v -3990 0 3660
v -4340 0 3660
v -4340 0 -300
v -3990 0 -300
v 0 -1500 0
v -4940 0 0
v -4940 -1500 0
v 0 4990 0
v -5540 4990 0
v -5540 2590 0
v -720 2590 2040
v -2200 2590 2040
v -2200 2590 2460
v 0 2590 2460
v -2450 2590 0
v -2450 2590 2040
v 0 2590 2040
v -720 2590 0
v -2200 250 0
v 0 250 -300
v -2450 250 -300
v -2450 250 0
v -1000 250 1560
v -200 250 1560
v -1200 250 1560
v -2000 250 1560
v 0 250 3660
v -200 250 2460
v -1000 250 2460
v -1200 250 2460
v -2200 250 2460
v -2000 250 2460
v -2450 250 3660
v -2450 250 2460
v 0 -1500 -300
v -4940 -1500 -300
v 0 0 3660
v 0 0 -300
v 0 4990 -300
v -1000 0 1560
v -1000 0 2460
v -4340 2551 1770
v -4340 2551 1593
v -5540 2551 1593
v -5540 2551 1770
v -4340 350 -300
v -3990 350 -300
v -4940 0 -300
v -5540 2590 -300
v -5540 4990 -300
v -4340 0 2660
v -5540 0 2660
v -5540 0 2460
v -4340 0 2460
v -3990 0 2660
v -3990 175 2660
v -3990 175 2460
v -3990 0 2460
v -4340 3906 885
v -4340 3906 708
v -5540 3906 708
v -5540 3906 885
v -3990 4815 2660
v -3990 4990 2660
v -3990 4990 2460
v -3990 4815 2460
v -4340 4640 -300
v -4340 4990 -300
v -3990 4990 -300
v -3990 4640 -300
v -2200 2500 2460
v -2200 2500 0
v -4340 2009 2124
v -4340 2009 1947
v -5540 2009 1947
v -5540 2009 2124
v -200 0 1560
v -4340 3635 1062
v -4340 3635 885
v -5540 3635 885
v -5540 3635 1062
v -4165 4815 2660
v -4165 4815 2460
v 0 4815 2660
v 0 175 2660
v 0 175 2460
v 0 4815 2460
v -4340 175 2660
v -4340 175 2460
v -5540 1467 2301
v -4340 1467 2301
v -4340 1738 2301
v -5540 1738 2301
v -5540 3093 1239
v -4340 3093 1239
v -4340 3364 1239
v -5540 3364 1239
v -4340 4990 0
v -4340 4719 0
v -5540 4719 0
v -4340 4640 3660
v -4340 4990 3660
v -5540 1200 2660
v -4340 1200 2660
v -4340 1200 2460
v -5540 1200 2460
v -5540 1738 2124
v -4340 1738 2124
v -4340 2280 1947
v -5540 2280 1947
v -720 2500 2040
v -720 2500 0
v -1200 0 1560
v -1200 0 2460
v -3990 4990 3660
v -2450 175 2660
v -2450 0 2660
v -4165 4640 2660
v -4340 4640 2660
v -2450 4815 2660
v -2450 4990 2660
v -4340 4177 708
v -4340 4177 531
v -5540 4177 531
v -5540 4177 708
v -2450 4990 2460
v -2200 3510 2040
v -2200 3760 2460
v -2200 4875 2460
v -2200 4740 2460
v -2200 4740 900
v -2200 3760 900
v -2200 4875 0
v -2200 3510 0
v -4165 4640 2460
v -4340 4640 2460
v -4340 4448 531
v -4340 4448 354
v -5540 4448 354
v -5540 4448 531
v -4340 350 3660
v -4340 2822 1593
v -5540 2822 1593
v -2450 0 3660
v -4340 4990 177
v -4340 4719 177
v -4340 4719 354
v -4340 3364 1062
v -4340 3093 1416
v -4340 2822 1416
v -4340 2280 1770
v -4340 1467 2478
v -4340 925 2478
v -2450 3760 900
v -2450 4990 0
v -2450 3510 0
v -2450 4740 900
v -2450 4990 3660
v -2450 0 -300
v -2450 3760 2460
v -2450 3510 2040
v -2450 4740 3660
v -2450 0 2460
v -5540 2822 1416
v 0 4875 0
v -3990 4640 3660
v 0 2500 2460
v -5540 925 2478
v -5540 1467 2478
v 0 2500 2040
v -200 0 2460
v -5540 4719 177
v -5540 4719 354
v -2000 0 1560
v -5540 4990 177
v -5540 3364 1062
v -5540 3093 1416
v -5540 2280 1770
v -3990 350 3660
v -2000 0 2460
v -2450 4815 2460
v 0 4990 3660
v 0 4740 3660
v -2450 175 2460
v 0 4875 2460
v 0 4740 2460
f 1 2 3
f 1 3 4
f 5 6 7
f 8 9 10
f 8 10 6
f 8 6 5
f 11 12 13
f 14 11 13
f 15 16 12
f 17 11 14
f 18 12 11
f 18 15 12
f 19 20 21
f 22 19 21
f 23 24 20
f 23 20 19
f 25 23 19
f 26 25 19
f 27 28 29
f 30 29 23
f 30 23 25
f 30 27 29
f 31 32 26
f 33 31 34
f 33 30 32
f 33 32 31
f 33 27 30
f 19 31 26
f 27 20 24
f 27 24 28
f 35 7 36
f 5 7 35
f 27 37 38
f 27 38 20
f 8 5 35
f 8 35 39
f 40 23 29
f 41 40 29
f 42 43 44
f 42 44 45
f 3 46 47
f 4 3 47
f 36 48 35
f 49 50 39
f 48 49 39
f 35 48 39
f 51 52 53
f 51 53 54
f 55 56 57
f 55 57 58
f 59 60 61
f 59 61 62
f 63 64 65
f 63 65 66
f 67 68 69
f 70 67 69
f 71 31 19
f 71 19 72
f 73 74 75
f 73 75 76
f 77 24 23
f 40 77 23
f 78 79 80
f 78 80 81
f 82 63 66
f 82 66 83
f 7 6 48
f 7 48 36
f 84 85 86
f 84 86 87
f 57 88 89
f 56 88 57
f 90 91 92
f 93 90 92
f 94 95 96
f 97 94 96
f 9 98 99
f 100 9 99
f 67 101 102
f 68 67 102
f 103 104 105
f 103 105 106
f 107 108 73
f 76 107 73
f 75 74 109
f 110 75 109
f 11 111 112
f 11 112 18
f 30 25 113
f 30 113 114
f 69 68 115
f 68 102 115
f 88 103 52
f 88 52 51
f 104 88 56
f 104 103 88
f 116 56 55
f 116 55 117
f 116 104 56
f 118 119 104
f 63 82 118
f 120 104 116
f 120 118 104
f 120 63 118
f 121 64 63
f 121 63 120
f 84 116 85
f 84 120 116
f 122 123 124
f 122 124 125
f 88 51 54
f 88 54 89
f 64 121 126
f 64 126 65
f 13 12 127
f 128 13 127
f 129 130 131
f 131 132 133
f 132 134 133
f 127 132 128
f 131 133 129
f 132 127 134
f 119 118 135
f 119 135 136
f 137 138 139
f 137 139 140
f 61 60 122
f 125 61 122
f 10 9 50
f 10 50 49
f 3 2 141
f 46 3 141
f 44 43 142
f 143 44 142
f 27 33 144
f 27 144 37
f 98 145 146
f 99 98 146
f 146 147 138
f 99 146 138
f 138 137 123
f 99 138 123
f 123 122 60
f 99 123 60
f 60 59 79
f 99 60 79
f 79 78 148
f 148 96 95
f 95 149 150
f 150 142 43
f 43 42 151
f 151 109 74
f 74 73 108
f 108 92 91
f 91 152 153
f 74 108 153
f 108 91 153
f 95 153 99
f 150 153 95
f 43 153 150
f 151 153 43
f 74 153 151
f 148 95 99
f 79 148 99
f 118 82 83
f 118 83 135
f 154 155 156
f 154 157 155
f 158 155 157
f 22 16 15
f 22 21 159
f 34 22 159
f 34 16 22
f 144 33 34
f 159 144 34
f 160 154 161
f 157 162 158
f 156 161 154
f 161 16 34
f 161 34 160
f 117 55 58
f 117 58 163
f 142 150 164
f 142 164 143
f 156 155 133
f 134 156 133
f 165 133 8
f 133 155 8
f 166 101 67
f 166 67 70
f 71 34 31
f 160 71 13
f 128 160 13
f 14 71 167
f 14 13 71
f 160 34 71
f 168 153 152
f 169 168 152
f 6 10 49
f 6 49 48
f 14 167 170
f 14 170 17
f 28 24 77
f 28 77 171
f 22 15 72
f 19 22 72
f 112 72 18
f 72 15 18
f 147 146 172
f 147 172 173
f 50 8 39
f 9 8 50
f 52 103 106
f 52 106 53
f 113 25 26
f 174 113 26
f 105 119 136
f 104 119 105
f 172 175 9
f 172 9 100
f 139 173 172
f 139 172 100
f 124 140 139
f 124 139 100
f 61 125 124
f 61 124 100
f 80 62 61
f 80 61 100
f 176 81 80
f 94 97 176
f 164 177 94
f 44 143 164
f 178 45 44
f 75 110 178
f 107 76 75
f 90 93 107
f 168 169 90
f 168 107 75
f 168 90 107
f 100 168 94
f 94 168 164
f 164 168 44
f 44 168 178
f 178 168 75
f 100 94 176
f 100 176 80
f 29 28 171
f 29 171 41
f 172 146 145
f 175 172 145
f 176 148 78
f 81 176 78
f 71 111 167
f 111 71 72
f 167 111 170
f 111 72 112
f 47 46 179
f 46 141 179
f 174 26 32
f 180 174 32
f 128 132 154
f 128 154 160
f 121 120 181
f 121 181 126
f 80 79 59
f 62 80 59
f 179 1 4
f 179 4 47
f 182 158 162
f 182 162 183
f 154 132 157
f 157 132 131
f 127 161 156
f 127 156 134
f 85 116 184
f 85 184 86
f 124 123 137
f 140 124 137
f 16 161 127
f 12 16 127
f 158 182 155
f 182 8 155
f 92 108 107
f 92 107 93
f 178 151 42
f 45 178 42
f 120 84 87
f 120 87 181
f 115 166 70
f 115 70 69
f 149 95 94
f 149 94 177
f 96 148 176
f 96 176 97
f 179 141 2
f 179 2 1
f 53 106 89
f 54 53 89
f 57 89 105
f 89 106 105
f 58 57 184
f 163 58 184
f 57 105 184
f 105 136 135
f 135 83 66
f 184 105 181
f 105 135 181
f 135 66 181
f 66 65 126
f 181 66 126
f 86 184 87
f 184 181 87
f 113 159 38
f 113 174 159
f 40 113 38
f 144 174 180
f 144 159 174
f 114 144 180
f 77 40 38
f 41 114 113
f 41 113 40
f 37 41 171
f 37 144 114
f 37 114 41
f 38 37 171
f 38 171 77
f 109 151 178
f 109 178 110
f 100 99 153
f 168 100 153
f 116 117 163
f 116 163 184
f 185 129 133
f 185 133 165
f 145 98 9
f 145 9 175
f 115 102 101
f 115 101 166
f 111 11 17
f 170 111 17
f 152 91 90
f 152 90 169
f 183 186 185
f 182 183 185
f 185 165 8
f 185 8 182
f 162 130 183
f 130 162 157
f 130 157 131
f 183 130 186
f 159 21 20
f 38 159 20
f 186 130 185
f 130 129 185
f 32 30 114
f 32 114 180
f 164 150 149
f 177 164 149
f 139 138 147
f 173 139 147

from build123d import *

# Parameters (mm, degrees)
F2_W          = 1480
F2_H          = 90
F2_W_2        = 350
F2_H_2        = 350
F2_W_3        = 250
F2_H_3        = 920
F2_H_4        = 135
F2_H_5        = 1230
F2_W_4        = 720
F3_DEPTH      = 300
F5_DEPTH      = 200
F6_DEPTH      = 2460
F7_START      = 2460
F7_DEPTH      = 1200
F8_DEPTH      = 3660
F8_DEPTH_BACK = 300
F9_W          = 271
F9_H          = 177
F10_DEPTH     = 1200
F11_DEPTH     = 2040
F12_W         = 800
F12_H         = 900
F13_DEPTH     = 250
F14_W         = 980
F14_H         = 1560
F15_DEPTH     = 250


# Not quite as in the source:
# - a feature names something its author has since deleted; it is built from what else it names


with BuildPart() as f3:
    # F2 (on Top) → F3 (new body)
    with BuildSketch(Plane.XY):
        Polygon((-4340, 4990), (-5540, 4990), (-5540, 2590), (-4940, 0), (-4340, 0), (-4340, 350), (-3990, 350), (-3990, 0), (-2450, 0), (-2450, 250), (-2450, 2590), (-2450, 3510), (-2450, 4740), (-2450, 4875), (-2450, 4990), (-3990, 4990), (-3990, 4640), (-4340, 4640), align=None)
        with Locations((-1460, 2545)):
            Rectangle(F2_W, F2_H)
        Polygon((-4340, 0), (-4940, 0), (-4940, -1500), (0, -1500), (0, 0), (-2450, 0), (-3990, 0), align=None)
        Polygon((0, 4990), (-2450, 4990), (-2450, 4875), (-2200, 4875), (-1229.6366691589, 4875), (0, 4875), align=None)
        with Locations((-4165, 4815)):
            Rectangle(F2_W_2, F2_H_2)
        with Locations((-4165, 175)):
            Rectangle(F2_W_2, F2_H_2)
        Polygon((-2200, 250), (0, 250), (0, 2500), (-720, 2500), (-2200, 2500), align=None)
        Polygon((-2450, 250), (-2450, 0), (0, 0), (0, 250), (-2200, 250), align=None)
        with Locations((-2325, 3050)):
            Rectangle(F2_W_3, F2_H_3)
        Polygon((0, 4740), (0, 4875), (-1229.6366691589, 4875), (-2200, 4875), (-2200, 4740), align=None)
        with Locations((-2325, 4807.5)):
            Rectangle(F2_W_3, F2_H_4)
        Polygon((-2450, 2590), (-2450, 250), (-2200, 250), (-2200, 2500), (-2200, 2590), align=None)
        with Locations((-2325, 4125)):
            Rectangle(F2_W_3, F2_H_5)
        Polygon((0, 2590), (0, 4740), (-2200, 4740), (-2200, 3510), (-2200, 2590), (-720, 2590), align=None)
        with Locations((-360, 2545)):
            Rectangle(F2_W_4, F2_H)
    extrude(amount=-F3_DEPTH)


with BuildPart() as f5:
    # F4 (on offset) → F5 (new body)
    with BuildSketch(Plane.XY.offset(2660)):
        Polygon((-4340, 1200), (-5540, 1200), (-5540, 0), (-4340, 0), (-4340, 175), (-3990, 175), (-3990, 0), (-2450, 0), (-2450, 175), (0, 175), (0, 4815), (-2450, 4815), (-2450, 4990), (-3990, 4990), (-3990, 4815), (-4165, 4815), (-4165, 4640), (-4340, 4640), align=None)
    extrude(amount=-F5_DEPTH)


with BuildPart() as f6:
    # F2 (on Top) → F6 (new body, through all)
    with BuildSketch(Plane.XY):
        Polygon((0, 4990), (-2450, 4990), (-2450, 4875), (-2200, 4875), (-1229.6366691589, 4875), (0, 4875), align=None)
        with Locations((-2325, 4807.5)):
            Rectangle(F2_W_3, F2_H_4)
        with Locations((-2325, 3050)):
            Rectangle(F2_W_3, F2_H_3)
        with Locations((-1460, 2545)):
            Rectangle(F2_W, F2_H)
        Polygon((-2450, 2590), (-2450, 250), (-2200, 250), (-2200, 2500), (-2200, 2590), align=None)
        with Locations((-2325, 4125)):
            Rectangle(F2_W_3, F2_H_5)
        with Locations((-360, 2545)):
            Rectangle(F2_W_4, F2_H)
    extrude(amount=F6_DEPTH)

    # F2 (on Top) → F7 (join)
    with BuildSketch(Plane.XY.offset(F7_START)):
        Polygon((0, 4740), (0, 4875), (-1229.6366691589, 4875), (-2200, 4875), (-2200, 4740), align=None)
        Polygon((0, 4990), (-2450, 4990), (-2450, 4875), (-2200, 4875), (-1229.6366691589, 4875), (0, 4875), align=None)
        with Locations((-2325, 4807.5)):
            Rectangle(F2_W_3, F2_H_4)
    extrude(amount=F7_DEPTH)

    # F2 (on Top) → F8 (join, two sides)
    with BuildSketch(Plane.XY) as f8_sk:
        Polygon((-2450, 250), (-2450, 0), (0, 0), (0, 250), (-2200, 250), align=None)
    extrude(amount=F8_DEPTH)
    extrude(f8_sk.sketch, amount=-F8_DEPTH_BACK)

    # F2 (on Top) → F11 (cut)
    with BuildSketch(Plane.XY):
        with Locations((-2325, 3050)):
            Rectangle(F2_W_3, F2_H_3)
        with Locations((-360, 2545)):
            Rectangle(F2_W_4, F2_H)
    extrude(amount=F11_DEPTH, mode=Mode.SUBTRACT)

    # F12 (on face) → F13 (cut, through all)
    with BuildSketch(Plane(origin=(0, 250, 0), x_dir=(-1, 0, 0), z_dir=(0, 1, 0))):
        with Locations((600, 2010)):
            Rectangle(F12_W, F12_H)
        with Locations((1600, 2010)):
            Rectangle(F12_W, F12_H)
    extrude(amount=-F13_DEPTH, mode=Mode.SUBTRACT)

    # F14 (on face) → F15 (cut, through all)
    with BuildSketch(Plane.YZ.offset(-2200)):
        with Locations((4250, 1680)):
            Rectangle(F14_W, F14_H)
    extrude(amount=-F15_DEPTH, mode=Mode.SUBTRACT)


with BuildPart() as f8:
    # F2 (on Top) → F8, piece 2 (new body, two sides)
    with BuildSketch(Plane.XY) as f8_2_sk:
        with Locations((-4165, 175)):
            Rectangle(F2_W_2, F2_H_2)
    extrude(amount=F8_DEPTH)
    extrude(f8_2_sk.sketch, amount=-F8_DEPTH_BACK)


with BuildPart() as f8b:
    # F2 (on Top) → F8, piece 3 (new body, two sides)
    with BuildSketch(Plane.XY) as f8_3_sk:
        with Locations((-4165, 4815)):
            Rectangle(F2_W_2, F2_H_2)
    extrude(amount=F8_DEPTH)
    extrude(f8_3_sk.sketch, amount=-F8_DEPTH_BACK)


with BuildPart() as f10:
    # F9 (on face) → F10 (new body)
    with BuildSketch(Plane(origin=(-4340, 0, 0), x_dir=(0, -1, 0), z_dir=(-1, 0, 0))):
        with Locations((-4854.5, 88.5)):
            Rectangle(F9_W, F9_H)
        Polygon((-4719, 177), (-4719, 0), (-4448, 177), align=None)
        with Locations((-4583.5, 265.5)):
            Rectangle(F9_W, F9_H)
        Polygon((-4448, 354), (-4448, 177), (-4177, 354), align=None)
        with Locations((-4312.5, 442.5)):
            Rectangle(F9_W, F9_H)
        Polygon((-4177, 531), (-4177, 354), (-3906, 531), align=None)
        with Locations((-4041.5, 619.5)):
            Rectangle(F9_W, F9_H)
        Polygon((-3906, 708), (-3906, 531), (-3635, 708), align=None)
        with Locations((-3770.5, 796.5)):
            Rectangle(F9_W, F9_H)
        Polygon((-3635, 885), (-3635, 708), (-3364, 885), align=None)
        with Locations((-3499.5, 973.5)):
            Rectangle(F9_W, F9_H)
        Polygon((-3364, 1062), (-3364, 885), (-3093, 1062), align=None)
        with Locations((-3228.5, 1150.5)):
            Rectangle(F9_W, F9_H)
        Polygon((-3093, 1239), (-3093, 1062), (-2822, 1239), align=None)
        with Locations((-2957.5, 1327.5)):
            Rectangle(F9_W, F9_H)
        Polygon((-2822, 1416), (-2822, 1239), (-2551, 1416), align=None)
        with Locations((-2686.5, 1504.5)):
            Rectangle(F9_W, F9_H)
        Polygon((-2551, 1593), (-2551, 1416), (-2280, 1593), align=None)
        with Locations((-2415.5, 1681.5)):
            Rectangle(F9_W, F9_H)
        Polygon((-2280, 1770), (-2280, 1593), (-2009, 1770), align=None)
        with Locations((-2144.5, 1858.5)):
            Rectangle(F9_W, F9_H)
        Polygon((-2009, 1947), (-2009, 1770), (-1738, 1947), align=None)
        with Locations((-1873.5, 2035.5)):
            Rectangle(F9_W, F9_H)
        Polygon((-1738, 2124), (-1738, 1947), (-1467, 2124), align=None)
        with Locations((-1602.5, 2212.5)):
            Rectangle(F9_W, F9_H)
        Polygon((-1467, 2301), (-1467, 2124), (-1196, 2301), align=None)
        with Locations((-1331.5, 2389.5)):
            Rectangle(F9_W, F9_H)
        Polygon((-1196, 2478), (-1196, 2301), (-925, 2478), align=None)
    extrude(amount=F10_DEPTH)


solid = Compound([f3.part, f5.part, f6.part, f8.part, f8b.part, f10.part])
